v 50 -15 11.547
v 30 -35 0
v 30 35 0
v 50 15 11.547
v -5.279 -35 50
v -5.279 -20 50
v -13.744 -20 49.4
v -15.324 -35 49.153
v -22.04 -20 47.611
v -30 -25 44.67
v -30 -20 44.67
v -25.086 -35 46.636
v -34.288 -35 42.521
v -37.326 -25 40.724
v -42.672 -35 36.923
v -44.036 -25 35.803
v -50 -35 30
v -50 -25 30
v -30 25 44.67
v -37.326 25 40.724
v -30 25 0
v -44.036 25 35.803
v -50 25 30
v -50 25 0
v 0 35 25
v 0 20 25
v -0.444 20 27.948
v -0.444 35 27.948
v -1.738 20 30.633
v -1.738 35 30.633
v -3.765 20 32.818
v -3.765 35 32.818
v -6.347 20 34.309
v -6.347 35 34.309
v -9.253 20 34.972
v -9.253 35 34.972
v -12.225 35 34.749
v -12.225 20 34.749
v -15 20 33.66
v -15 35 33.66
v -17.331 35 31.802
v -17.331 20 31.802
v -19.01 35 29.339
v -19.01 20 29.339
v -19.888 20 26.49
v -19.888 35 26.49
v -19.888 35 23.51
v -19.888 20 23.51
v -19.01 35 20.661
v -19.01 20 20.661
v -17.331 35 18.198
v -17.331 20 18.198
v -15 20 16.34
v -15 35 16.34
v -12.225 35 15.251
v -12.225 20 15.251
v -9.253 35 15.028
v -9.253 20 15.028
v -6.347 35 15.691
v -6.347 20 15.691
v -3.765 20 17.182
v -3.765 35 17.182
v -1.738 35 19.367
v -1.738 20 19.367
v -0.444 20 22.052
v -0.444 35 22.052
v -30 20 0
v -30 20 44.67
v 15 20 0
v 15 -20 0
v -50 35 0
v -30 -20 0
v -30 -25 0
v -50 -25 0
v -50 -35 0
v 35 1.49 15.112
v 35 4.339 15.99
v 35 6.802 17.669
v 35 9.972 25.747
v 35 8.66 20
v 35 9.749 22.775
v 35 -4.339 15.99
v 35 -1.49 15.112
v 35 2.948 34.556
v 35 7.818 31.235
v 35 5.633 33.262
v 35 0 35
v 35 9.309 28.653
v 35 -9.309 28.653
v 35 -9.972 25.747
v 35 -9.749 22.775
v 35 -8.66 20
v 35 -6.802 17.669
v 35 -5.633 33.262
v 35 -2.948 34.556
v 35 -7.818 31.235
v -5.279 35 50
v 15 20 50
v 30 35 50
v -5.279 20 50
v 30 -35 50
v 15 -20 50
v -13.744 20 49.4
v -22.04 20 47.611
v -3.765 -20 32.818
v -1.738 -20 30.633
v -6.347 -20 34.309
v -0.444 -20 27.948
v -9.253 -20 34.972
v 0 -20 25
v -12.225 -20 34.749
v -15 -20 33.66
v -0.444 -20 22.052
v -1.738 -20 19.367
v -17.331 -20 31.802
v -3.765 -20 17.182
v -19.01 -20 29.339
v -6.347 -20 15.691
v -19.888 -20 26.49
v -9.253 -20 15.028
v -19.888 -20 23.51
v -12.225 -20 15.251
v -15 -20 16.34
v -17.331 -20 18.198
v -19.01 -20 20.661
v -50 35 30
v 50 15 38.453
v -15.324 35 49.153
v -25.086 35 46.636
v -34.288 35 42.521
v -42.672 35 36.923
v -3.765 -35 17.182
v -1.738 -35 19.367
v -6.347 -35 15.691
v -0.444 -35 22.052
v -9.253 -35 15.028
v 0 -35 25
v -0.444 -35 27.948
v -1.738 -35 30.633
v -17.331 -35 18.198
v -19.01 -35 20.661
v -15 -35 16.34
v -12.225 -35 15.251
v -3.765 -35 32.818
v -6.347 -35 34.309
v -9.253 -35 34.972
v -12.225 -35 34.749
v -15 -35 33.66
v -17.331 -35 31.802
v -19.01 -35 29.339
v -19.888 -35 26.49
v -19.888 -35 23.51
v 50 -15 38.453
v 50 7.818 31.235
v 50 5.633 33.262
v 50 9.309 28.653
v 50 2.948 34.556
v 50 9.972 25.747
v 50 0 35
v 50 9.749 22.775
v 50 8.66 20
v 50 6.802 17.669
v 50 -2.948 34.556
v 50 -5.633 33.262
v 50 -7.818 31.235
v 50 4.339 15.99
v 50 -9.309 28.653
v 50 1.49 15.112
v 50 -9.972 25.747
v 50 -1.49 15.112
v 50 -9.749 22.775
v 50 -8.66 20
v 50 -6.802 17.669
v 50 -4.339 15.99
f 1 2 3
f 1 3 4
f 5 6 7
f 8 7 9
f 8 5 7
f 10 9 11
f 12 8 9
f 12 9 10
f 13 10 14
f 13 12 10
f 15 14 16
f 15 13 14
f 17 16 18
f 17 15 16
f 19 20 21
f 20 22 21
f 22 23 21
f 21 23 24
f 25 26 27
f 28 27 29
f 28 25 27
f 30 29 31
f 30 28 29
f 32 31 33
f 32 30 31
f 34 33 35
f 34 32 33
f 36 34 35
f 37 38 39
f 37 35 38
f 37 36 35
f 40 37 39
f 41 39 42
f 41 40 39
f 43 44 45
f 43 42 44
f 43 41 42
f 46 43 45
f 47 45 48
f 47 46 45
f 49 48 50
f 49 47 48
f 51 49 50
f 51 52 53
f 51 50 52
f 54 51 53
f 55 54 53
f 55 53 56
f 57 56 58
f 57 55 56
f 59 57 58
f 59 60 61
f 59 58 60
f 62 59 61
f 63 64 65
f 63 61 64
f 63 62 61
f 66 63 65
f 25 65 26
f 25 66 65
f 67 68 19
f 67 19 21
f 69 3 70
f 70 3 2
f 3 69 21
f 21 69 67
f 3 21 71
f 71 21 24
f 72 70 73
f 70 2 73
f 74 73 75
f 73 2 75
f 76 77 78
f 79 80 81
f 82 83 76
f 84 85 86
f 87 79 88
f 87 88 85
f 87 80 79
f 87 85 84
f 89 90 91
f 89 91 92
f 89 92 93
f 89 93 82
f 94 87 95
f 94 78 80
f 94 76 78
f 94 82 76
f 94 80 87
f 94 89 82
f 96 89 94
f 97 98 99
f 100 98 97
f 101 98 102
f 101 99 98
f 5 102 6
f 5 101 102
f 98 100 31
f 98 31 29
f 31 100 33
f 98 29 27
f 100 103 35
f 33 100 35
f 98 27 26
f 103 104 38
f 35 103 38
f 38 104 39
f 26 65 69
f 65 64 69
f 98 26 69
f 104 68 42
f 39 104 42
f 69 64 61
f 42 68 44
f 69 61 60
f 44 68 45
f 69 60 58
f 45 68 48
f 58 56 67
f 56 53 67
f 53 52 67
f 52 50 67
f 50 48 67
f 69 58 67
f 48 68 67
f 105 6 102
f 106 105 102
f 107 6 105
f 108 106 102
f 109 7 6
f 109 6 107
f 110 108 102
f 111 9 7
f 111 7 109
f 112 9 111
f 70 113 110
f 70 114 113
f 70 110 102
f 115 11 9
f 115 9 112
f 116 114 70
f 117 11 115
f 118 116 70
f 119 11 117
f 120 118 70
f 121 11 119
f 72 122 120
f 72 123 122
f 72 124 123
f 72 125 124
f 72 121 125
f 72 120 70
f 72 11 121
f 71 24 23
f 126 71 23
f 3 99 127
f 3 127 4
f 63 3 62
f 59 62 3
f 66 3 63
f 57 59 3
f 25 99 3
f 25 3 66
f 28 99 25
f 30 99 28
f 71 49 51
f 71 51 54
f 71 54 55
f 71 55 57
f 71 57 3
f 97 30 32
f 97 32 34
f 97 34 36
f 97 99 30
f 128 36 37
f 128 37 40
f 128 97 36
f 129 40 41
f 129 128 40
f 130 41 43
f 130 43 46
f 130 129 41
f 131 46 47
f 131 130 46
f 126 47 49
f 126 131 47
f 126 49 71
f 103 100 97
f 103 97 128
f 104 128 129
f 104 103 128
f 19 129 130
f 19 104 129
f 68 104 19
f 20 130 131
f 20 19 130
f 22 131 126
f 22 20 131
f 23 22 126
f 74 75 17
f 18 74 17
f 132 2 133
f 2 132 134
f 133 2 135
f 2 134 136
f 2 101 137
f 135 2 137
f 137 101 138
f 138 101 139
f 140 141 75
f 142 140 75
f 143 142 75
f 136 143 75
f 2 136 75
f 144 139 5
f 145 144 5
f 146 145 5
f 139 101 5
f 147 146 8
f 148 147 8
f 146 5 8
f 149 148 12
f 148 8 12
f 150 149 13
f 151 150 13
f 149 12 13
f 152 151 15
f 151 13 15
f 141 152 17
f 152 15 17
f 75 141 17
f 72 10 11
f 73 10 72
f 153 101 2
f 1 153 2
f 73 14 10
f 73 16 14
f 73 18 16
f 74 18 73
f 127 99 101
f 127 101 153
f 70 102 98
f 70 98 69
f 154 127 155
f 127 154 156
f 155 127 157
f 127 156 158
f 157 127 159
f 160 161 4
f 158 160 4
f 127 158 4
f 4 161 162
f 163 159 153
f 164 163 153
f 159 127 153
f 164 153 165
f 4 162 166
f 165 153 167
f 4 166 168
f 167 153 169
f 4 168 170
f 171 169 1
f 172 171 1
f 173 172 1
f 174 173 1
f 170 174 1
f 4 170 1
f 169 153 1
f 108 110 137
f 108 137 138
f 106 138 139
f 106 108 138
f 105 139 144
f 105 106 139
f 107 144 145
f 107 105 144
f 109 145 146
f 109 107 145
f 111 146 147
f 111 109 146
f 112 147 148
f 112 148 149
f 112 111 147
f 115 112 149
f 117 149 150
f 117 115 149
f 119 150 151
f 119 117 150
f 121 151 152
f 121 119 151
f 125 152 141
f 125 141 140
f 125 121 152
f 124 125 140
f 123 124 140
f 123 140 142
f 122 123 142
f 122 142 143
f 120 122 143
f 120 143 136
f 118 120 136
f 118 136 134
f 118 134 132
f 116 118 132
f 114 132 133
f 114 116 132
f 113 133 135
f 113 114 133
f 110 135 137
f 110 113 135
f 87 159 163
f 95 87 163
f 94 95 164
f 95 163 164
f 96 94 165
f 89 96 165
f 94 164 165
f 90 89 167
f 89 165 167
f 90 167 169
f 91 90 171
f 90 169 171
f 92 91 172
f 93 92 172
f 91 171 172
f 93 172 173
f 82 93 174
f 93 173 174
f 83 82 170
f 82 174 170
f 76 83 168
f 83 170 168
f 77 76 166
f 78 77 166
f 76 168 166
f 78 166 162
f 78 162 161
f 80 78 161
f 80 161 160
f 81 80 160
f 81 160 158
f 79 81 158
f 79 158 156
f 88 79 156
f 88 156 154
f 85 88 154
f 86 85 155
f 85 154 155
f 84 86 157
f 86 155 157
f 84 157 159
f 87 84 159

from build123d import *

# Parameters (mm, degrees)
SKETCH_R        = 10
PAD_DEPTH       = 35
POCKET_DEPTH    = 70.001
CHAMFER_SIZE    = 20
CHAMFER001_SIZE = 20
SKETCH002_R     = 10
POCKET001_DEPTH = 15
SKETCH003_W     = 81.266709
SKETCH003_H     = 40
POCKET002_DEPTH = 65
SKETCH004_W     = 95.373383
SKETCH004_H     = 50
POCKET003_DEPTH = 20


with BuildPart() as part:
    # Sketch → Pad (new body, symmetric)
    with BuildSketch(Plane.XZ):
        with BuildLine():
            Line((50, 50), (50, 0))
            Line((50, 0), (-50, 0))
            Line((-50, 0), (-50, 30))
            ThreePointArc((-5.278546, 50), (-29.773495, 44.772275), (-50, 30))
            Line((50, 50), (-5.278546, 50))
        make_face()
        with Locations((-10, 25)):
            Circle(SKETCH_R, mode=Mode.SUBTRACT)
    extrude(amount=PAD_DEPTH, both=True)

    # Sketch001 → Pocket (cut, through all)
    with BuildSketch(Plane.XZ.offset(35)):
        Polygon((50, 50), (30, 50), (50, 38.452995), align=None)
        Polygon((50, 0), (30, 0), (50, 11.547005), align=None)
    extrude(amount=-POCKET_DEPTH, mode=Mode.SUBTRACT)

    # Chamfer
    chamfer_edges = [part.edges().sort_by_distance(p)[0] for p in [
        (50, -35, 25),
    ]]
    chamfer(chamfer_edges, length=CHAMFER_SIZE)

    # Chamfer001
    chamfer001_edges = [part.edges().sort_by_distance(p)[0] for p in [
        (50, 35, 25),
    ]]
    chamfer(chamfer001_edges, length=CHAMFER001_SIZE)

    # Sketch002 → Pocket001 (cut)
    with BuildSketch(Plane(origin=(50, 0, 0), x_dir=(0, 0, 1), z_dir=(1, 0, 0))):
        with Locations((25, 0)):
            Circle(SKETCH002_R)
    extrude(amount=-POCKET001_DEPTH, mode=Mode.SUBTRACT)

    # Sketch003 → Pocket002 (cut)
    with BuildSketch(Plane(origin=(-50, 0, 0), x_dir=(0, 0, -1), z_dir=(-1, 0, 0))):
        with Locations((-25.823334, 0)):
            Rectangle(SKETCH003_W, SKETCH003_H)
    extrude(amount=-POCKET002_DEPTH, mode=Mode.SUBTRACT)

    # Sketch004 → Pocket003 (cut)
    with BuildSketch(Plane(origin=(-50, 0, 0), x_dir=(0, 0, -1), z_dir=(-1, 0, 0))):
        with Locations((-23.676658, 0)):
            Rectangle(SKETCH004_W, SKETCH004_H)
    extrude(amount=-POCKET003_DEPTH, mode=Mode.SUBTRACT)


solid = part.part
